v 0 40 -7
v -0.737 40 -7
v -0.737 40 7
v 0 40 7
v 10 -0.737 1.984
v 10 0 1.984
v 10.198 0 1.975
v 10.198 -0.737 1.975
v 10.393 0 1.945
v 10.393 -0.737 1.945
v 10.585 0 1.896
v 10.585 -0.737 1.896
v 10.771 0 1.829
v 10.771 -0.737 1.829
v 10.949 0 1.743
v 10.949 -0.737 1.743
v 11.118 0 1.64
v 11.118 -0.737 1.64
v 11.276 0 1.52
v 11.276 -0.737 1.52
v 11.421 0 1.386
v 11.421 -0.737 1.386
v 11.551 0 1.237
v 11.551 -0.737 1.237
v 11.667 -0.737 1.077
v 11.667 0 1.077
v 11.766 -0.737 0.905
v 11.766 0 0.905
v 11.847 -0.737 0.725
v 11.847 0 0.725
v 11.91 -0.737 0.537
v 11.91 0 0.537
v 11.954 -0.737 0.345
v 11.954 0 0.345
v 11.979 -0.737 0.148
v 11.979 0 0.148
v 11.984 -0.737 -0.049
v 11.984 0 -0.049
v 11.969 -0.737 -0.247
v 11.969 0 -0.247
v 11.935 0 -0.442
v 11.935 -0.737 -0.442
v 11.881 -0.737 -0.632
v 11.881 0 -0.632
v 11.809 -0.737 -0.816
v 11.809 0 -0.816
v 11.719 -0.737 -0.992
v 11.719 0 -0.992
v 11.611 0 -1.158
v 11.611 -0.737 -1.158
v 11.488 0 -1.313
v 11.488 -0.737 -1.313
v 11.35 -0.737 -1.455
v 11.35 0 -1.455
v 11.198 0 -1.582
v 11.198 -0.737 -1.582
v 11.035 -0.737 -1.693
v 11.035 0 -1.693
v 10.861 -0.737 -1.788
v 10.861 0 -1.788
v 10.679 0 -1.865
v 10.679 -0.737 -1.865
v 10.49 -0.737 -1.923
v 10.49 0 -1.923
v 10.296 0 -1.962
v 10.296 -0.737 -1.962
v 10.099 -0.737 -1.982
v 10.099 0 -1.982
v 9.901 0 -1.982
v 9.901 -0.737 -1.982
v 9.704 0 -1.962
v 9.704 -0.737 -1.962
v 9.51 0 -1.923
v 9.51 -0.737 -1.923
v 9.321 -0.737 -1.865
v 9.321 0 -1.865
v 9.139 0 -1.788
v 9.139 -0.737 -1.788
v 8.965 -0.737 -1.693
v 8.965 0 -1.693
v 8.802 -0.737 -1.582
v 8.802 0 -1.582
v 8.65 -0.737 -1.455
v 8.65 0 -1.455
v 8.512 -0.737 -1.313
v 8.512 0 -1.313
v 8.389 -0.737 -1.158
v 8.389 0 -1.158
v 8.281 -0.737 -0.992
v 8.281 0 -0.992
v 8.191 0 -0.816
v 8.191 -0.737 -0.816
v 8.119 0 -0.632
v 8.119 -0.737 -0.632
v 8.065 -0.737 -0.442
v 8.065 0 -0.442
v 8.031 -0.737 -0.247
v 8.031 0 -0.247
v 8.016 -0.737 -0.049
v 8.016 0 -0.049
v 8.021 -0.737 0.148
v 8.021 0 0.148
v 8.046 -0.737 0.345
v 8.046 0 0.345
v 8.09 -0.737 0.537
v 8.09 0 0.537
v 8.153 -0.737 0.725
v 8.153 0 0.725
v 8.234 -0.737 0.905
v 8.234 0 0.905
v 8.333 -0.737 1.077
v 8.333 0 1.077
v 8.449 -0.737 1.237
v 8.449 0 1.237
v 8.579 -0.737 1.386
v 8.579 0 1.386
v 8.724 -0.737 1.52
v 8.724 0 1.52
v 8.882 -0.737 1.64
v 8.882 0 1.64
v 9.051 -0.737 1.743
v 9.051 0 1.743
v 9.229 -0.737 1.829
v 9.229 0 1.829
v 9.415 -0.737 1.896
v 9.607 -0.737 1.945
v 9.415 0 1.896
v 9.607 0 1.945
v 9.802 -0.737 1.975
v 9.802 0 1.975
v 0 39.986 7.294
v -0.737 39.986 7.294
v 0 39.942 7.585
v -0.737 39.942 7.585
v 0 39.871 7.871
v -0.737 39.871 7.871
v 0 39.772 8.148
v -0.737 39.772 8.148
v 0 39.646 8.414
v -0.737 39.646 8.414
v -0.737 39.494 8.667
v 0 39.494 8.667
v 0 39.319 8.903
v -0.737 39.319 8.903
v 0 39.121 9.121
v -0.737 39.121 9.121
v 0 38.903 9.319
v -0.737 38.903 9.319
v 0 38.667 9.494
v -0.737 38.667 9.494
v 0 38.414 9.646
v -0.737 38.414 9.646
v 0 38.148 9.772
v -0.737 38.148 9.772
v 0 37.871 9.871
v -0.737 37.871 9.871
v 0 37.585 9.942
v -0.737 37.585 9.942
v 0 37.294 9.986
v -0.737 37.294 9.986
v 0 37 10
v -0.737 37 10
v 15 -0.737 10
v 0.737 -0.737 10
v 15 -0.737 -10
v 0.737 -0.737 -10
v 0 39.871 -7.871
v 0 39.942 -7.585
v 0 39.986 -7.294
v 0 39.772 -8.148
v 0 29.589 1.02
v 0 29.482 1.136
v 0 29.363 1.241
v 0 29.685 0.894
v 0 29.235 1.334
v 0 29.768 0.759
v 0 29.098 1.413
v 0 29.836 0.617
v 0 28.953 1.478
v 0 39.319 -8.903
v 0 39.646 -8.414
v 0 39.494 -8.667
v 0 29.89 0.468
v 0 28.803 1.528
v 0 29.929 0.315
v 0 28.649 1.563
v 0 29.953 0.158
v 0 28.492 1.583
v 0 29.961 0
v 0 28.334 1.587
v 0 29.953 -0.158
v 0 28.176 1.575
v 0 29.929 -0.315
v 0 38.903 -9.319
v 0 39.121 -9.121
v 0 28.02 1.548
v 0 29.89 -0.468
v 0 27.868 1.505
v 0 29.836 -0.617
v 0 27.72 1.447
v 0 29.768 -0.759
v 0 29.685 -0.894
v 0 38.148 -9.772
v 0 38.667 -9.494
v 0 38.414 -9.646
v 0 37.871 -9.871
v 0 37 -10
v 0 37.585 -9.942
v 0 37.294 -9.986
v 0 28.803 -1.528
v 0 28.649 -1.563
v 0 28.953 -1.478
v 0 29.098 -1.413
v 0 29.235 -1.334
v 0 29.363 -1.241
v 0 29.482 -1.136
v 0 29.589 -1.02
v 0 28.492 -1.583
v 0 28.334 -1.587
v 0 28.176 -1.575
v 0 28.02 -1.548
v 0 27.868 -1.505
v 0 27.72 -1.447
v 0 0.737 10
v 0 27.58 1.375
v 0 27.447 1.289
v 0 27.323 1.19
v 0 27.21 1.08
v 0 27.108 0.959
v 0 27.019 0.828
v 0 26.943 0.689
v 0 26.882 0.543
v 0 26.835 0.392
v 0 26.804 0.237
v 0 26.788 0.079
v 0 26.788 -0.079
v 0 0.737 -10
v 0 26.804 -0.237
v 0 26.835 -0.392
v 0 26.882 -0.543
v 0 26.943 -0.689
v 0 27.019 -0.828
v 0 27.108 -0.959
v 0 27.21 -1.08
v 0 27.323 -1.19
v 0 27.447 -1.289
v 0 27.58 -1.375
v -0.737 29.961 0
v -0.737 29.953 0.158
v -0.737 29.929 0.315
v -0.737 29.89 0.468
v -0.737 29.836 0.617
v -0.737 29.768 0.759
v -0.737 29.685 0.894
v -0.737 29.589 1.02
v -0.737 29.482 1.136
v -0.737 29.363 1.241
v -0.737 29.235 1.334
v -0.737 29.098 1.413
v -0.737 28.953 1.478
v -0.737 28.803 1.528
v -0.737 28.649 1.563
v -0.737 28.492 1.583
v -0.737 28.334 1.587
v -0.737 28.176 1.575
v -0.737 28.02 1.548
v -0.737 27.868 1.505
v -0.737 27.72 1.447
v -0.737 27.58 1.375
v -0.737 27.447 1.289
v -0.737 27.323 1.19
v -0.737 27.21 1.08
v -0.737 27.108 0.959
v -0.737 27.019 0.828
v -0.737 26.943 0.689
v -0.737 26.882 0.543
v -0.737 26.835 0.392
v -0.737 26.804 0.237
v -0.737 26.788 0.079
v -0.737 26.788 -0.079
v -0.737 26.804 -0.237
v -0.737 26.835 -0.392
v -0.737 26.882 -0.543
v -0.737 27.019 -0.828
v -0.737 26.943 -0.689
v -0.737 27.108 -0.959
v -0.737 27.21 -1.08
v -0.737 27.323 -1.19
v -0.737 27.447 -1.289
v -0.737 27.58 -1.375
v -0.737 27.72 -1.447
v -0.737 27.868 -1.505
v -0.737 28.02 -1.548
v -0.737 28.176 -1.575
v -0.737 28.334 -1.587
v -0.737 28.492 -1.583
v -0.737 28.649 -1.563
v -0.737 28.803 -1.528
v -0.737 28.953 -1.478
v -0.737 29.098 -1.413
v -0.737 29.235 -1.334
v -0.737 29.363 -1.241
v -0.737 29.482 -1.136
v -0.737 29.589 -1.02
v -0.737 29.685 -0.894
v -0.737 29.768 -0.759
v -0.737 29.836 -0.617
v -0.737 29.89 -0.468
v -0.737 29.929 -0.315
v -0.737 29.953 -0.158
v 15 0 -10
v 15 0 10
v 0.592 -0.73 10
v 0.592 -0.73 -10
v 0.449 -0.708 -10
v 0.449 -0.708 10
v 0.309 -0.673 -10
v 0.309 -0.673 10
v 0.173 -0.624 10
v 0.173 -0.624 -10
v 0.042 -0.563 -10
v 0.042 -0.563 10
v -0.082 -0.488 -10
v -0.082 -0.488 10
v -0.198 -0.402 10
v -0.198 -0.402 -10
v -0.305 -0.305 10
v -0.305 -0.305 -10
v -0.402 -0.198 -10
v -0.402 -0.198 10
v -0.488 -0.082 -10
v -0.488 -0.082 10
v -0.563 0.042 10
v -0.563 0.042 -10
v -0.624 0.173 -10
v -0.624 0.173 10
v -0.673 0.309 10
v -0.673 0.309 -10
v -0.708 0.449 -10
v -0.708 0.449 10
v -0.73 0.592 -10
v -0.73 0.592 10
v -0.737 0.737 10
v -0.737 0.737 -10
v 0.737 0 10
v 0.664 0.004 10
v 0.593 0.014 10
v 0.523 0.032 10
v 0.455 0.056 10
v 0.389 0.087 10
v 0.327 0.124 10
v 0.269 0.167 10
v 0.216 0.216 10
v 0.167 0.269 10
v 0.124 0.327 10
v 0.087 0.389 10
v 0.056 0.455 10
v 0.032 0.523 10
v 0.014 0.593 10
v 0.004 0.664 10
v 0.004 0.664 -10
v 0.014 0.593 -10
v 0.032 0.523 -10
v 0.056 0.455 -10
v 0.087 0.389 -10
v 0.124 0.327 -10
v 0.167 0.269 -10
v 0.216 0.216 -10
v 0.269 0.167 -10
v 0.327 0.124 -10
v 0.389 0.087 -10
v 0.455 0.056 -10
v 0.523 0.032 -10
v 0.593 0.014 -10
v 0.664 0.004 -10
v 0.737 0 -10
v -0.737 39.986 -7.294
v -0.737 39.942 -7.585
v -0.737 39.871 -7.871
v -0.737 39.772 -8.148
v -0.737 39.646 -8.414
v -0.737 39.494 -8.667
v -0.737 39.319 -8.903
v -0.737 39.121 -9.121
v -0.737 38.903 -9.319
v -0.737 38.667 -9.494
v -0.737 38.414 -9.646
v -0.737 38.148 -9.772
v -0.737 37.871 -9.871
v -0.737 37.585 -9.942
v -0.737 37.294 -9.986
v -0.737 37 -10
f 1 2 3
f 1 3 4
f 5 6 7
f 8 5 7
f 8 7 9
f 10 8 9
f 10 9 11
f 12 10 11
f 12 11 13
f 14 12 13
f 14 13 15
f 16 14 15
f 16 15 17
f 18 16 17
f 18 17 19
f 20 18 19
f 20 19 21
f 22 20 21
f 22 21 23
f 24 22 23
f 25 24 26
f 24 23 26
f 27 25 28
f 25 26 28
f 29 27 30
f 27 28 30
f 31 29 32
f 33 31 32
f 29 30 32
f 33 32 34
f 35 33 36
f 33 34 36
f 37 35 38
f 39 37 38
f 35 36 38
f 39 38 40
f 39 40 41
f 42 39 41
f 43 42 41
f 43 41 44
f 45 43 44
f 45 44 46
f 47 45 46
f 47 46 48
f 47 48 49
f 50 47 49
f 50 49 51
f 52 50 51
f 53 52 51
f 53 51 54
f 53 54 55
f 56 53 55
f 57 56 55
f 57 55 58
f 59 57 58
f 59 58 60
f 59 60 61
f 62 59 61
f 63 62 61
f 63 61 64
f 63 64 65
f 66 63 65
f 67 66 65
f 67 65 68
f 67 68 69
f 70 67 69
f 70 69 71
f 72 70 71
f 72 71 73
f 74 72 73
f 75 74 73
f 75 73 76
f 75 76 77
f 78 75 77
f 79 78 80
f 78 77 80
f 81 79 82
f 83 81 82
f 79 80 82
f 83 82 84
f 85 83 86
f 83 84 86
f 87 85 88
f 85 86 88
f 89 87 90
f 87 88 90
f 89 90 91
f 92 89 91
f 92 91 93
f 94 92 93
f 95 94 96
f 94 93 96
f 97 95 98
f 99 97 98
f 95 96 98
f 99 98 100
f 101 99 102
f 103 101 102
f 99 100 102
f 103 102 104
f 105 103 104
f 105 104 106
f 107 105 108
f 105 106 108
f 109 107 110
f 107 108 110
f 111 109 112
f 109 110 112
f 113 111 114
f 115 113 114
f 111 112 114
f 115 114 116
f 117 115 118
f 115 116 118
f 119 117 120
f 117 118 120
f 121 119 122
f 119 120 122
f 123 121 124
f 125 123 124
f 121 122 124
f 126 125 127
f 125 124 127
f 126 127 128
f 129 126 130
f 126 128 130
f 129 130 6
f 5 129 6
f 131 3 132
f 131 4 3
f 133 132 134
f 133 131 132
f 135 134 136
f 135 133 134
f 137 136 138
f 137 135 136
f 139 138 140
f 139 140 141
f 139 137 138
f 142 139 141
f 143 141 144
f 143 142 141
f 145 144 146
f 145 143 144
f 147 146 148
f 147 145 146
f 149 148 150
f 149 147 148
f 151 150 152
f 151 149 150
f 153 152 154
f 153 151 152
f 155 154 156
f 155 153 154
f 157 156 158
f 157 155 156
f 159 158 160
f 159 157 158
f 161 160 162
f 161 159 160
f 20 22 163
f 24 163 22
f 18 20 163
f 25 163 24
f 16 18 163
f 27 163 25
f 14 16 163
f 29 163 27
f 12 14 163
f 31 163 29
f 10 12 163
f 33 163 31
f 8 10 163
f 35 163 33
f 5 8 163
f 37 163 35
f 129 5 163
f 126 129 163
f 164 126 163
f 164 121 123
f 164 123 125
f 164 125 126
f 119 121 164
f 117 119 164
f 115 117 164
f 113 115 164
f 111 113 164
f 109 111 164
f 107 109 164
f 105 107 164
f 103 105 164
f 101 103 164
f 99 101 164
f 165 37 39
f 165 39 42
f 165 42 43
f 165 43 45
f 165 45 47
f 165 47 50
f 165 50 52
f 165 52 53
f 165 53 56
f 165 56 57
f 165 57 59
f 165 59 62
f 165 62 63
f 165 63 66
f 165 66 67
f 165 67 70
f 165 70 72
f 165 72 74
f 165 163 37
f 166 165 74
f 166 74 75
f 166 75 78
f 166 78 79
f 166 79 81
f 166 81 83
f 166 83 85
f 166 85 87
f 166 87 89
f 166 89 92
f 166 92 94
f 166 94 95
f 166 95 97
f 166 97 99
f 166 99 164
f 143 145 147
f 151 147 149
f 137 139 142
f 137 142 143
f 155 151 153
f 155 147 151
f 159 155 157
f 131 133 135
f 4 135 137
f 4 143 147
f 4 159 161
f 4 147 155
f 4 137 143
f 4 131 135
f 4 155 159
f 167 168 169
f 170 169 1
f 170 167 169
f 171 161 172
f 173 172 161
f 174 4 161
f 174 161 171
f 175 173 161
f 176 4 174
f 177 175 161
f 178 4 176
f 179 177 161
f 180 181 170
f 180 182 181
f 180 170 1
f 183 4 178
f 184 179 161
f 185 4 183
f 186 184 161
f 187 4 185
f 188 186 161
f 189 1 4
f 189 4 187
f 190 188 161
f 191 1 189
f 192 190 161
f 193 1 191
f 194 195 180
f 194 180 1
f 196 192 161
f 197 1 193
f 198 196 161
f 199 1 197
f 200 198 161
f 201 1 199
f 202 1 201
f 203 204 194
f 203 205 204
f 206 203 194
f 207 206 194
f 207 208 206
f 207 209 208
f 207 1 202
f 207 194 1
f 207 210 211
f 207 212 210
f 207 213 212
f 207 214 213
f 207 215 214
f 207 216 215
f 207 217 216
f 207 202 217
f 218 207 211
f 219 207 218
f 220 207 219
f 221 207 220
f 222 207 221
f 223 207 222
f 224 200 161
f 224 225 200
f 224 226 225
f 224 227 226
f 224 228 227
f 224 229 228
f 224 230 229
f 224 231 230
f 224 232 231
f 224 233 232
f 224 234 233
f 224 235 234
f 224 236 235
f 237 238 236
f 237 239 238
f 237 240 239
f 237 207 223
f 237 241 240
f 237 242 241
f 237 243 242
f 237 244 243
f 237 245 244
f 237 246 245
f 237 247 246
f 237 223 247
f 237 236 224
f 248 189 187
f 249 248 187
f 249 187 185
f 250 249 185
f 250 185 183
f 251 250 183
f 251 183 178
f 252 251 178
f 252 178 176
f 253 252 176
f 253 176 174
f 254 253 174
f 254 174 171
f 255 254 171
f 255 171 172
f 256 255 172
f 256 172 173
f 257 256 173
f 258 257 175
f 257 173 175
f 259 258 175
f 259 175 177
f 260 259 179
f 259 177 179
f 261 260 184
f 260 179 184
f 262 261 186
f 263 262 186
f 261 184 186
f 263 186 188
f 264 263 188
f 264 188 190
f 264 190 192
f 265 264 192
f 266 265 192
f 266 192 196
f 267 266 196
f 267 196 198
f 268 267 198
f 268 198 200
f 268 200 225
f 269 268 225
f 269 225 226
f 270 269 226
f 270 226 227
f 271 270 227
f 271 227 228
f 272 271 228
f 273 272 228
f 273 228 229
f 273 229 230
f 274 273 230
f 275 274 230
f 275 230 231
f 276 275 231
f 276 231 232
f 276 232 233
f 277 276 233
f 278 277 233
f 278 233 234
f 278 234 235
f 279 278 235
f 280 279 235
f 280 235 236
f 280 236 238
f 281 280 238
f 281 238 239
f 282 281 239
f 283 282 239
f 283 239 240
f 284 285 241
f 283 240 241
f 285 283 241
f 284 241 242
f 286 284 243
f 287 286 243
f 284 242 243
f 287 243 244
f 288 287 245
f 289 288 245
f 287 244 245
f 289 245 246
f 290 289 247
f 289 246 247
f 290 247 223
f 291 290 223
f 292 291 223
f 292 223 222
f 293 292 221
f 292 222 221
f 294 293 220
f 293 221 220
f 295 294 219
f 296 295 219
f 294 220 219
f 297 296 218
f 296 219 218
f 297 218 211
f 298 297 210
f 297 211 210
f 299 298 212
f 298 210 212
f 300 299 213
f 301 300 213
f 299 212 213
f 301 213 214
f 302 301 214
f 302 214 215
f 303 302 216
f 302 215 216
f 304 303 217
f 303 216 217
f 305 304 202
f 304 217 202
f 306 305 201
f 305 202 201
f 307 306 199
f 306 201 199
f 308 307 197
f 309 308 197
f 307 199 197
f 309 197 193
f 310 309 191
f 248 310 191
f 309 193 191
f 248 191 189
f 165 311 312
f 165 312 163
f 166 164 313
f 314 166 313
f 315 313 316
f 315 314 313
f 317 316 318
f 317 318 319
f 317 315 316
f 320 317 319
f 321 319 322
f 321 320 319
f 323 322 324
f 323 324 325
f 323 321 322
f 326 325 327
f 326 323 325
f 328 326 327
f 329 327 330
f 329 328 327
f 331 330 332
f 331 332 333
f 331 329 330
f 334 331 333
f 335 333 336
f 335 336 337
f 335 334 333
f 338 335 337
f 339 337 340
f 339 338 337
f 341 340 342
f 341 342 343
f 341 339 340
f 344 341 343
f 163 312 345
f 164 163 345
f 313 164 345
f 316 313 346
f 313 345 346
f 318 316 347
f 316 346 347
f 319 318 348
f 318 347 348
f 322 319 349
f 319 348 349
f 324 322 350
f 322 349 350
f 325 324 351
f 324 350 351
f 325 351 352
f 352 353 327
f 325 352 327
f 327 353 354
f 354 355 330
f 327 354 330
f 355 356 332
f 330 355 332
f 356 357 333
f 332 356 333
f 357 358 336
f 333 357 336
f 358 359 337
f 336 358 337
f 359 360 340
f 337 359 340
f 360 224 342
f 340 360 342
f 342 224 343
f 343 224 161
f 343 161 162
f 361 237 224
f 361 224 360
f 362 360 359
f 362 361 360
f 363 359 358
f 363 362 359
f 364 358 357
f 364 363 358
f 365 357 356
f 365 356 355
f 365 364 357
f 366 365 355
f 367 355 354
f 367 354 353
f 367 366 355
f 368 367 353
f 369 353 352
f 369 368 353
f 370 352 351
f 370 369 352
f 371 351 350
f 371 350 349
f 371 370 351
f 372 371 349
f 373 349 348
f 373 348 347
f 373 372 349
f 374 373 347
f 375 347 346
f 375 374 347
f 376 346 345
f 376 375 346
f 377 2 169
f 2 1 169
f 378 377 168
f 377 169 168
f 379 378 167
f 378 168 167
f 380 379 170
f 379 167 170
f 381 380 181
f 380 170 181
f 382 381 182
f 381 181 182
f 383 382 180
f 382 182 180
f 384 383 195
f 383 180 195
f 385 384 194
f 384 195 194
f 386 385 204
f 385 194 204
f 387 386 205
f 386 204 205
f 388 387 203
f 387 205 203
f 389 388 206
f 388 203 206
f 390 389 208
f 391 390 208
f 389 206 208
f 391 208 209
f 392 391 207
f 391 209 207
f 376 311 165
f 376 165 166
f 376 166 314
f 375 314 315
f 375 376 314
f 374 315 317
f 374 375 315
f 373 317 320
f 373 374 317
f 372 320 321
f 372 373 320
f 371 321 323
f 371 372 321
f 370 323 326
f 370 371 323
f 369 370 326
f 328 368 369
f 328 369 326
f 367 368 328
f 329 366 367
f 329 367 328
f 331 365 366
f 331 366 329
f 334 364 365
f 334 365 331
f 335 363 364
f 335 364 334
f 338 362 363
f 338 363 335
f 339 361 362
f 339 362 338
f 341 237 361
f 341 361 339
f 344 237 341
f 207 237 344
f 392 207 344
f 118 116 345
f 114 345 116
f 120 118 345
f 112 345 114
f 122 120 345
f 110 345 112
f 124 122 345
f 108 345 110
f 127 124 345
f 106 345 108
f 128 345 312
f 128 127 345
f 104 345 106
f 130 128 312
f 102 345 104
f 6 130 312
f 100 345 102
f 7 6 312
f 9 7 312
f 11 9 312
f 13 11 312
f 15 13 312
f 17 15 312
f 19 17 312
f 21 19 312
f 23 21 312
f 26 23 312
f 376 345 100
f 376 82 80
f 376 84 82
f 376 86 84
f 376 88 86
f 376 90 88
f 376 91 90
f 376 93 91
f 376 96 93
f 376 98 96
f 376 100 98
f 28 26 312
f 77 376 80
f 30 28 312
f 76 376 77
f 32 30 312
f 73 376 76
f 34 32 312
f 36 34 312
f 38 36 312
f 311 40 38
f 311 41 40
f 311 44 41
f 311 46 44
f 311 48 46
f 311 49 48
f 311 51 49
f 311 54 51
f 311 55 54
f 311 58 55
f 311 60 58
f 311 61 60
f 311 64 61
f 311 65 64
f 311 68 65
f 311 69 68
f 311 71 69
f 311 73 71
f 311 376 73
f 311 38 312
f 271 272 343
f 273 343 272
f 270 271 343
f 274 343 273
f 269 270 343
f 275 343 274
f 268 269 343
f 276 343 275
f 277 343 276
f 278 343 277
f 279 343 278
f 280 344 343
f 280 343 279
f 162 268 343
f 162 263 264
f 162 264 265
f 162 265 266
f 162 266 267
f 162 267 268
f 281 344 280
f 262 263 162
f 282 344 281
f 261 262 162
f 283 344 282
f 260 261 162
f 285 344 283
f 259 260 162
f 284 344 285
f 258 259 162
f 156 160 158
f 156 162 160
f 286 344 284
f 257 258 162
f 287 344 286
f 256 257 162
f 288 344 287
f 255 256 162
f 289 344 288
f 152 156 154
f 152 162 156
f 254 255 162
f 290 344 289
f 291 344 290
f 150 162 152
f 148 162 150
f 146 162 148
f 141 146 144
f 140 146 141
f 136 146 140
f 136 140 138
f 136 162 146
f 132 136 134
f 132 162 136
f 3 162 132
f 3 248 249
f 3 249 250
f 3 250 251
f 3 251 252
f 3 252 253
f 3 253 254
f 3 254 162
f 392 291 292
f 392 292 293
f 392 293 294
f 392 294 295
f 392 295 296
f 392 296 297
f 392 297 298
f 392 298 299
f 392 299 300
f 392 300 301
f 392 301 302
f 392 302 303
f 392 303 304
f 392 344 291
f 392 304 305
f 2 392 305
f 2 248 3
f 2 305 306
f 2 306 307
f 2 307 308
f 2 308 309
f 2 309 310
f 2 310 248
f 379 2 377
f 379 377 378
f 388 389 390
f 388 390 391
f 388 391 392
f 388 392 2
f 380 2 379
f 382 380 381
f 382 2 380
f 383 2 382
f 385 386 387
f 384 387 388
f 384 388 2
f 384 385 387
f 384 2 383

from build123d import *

# Parameters (mm, degrees)
BASE_FLANGE1_DEPTH      = 10
BASE_FLANGE1_DEPTH_BACK = 10
SKETCH6_R               = 1.5875
CUT_EXTRUDE1_DEPTH      = 10
SKETCH7_R               = 1.984375
CUT_EXTRUDE2_DEPTH      = 10
FILLET1_R               = 3


# Sheet-metal steps are written as plain solids
with BuildPart() as part:
    # Sketch1 → Base-Flange1 (new, two sides: drawn at the far end of the back side and taken through both)
    with BuildSketch(Plane.XY.offset(-BASE_FLANGE1_DEPTH_BACK)):
        with BuildLine():
            Line((0, 40), (0, 0.7366))
            ThreePointArc((0, 0.7366), (0.215745145, 0.215745145), (0.7366, 0))
            Line((0.7366, 0), (15, 0))
            Line((15, 0), (15, -0.7366))
            Line((15, -0.7366), (0.7366, -0.7366))
            ThreePointArc((0.7366, -0.7366), (-0.30510971, -0.30510971), (-0.7366, 0.7366))
            Line((-0.7366, 0.7366), (-0.7366, 40))
            Line((-0.7366, 40), (0, 40))
        make_face()
    extrude(amount=BASE_FLANGE1_DEPTH + BASE_FLANGE1_DEPTH_BACK)

    # Sketch6 → Cut-Extrude1 (cut)
    with BuildSketch(Plane(origin=(0, 0, 0), x_dir=(0, 0, -1), z_dir=(1, 0, 0))):
        with Locations(Location((0, 28.3734, 0), (0, 0, 90))):
            Circle(SKETCH6_R)
    extrude(amount=-CUT_EXTRUDE1_DEPTH, mode=Mode.SUBTRACT)

    # Sketch7 → Cut-Extrude2 (cut)
    with BuildSketch(Plane(origin=(0, 0, 0), x_dir=(1, 0, 0), z_dir=(0, 1, 0))):
        with Locations(Location((10, 0, 0), (0, 0, 270))):
            Circle(SKETCH7_R)
    extrude(amount=-CUT_EXTRUDE2_DEPTH, mode=Mode.SUBTRACT)

    # Fillet1
    fillet1_edges = [part.edges().sort_by_distance(p)[0] for p in [
        (-0.3683, 40, 10),
        (-0.3683, 40, -10),
    ]]
    fillet(fillet1_edges, radius=FILLET1_R)


solid = part.part
